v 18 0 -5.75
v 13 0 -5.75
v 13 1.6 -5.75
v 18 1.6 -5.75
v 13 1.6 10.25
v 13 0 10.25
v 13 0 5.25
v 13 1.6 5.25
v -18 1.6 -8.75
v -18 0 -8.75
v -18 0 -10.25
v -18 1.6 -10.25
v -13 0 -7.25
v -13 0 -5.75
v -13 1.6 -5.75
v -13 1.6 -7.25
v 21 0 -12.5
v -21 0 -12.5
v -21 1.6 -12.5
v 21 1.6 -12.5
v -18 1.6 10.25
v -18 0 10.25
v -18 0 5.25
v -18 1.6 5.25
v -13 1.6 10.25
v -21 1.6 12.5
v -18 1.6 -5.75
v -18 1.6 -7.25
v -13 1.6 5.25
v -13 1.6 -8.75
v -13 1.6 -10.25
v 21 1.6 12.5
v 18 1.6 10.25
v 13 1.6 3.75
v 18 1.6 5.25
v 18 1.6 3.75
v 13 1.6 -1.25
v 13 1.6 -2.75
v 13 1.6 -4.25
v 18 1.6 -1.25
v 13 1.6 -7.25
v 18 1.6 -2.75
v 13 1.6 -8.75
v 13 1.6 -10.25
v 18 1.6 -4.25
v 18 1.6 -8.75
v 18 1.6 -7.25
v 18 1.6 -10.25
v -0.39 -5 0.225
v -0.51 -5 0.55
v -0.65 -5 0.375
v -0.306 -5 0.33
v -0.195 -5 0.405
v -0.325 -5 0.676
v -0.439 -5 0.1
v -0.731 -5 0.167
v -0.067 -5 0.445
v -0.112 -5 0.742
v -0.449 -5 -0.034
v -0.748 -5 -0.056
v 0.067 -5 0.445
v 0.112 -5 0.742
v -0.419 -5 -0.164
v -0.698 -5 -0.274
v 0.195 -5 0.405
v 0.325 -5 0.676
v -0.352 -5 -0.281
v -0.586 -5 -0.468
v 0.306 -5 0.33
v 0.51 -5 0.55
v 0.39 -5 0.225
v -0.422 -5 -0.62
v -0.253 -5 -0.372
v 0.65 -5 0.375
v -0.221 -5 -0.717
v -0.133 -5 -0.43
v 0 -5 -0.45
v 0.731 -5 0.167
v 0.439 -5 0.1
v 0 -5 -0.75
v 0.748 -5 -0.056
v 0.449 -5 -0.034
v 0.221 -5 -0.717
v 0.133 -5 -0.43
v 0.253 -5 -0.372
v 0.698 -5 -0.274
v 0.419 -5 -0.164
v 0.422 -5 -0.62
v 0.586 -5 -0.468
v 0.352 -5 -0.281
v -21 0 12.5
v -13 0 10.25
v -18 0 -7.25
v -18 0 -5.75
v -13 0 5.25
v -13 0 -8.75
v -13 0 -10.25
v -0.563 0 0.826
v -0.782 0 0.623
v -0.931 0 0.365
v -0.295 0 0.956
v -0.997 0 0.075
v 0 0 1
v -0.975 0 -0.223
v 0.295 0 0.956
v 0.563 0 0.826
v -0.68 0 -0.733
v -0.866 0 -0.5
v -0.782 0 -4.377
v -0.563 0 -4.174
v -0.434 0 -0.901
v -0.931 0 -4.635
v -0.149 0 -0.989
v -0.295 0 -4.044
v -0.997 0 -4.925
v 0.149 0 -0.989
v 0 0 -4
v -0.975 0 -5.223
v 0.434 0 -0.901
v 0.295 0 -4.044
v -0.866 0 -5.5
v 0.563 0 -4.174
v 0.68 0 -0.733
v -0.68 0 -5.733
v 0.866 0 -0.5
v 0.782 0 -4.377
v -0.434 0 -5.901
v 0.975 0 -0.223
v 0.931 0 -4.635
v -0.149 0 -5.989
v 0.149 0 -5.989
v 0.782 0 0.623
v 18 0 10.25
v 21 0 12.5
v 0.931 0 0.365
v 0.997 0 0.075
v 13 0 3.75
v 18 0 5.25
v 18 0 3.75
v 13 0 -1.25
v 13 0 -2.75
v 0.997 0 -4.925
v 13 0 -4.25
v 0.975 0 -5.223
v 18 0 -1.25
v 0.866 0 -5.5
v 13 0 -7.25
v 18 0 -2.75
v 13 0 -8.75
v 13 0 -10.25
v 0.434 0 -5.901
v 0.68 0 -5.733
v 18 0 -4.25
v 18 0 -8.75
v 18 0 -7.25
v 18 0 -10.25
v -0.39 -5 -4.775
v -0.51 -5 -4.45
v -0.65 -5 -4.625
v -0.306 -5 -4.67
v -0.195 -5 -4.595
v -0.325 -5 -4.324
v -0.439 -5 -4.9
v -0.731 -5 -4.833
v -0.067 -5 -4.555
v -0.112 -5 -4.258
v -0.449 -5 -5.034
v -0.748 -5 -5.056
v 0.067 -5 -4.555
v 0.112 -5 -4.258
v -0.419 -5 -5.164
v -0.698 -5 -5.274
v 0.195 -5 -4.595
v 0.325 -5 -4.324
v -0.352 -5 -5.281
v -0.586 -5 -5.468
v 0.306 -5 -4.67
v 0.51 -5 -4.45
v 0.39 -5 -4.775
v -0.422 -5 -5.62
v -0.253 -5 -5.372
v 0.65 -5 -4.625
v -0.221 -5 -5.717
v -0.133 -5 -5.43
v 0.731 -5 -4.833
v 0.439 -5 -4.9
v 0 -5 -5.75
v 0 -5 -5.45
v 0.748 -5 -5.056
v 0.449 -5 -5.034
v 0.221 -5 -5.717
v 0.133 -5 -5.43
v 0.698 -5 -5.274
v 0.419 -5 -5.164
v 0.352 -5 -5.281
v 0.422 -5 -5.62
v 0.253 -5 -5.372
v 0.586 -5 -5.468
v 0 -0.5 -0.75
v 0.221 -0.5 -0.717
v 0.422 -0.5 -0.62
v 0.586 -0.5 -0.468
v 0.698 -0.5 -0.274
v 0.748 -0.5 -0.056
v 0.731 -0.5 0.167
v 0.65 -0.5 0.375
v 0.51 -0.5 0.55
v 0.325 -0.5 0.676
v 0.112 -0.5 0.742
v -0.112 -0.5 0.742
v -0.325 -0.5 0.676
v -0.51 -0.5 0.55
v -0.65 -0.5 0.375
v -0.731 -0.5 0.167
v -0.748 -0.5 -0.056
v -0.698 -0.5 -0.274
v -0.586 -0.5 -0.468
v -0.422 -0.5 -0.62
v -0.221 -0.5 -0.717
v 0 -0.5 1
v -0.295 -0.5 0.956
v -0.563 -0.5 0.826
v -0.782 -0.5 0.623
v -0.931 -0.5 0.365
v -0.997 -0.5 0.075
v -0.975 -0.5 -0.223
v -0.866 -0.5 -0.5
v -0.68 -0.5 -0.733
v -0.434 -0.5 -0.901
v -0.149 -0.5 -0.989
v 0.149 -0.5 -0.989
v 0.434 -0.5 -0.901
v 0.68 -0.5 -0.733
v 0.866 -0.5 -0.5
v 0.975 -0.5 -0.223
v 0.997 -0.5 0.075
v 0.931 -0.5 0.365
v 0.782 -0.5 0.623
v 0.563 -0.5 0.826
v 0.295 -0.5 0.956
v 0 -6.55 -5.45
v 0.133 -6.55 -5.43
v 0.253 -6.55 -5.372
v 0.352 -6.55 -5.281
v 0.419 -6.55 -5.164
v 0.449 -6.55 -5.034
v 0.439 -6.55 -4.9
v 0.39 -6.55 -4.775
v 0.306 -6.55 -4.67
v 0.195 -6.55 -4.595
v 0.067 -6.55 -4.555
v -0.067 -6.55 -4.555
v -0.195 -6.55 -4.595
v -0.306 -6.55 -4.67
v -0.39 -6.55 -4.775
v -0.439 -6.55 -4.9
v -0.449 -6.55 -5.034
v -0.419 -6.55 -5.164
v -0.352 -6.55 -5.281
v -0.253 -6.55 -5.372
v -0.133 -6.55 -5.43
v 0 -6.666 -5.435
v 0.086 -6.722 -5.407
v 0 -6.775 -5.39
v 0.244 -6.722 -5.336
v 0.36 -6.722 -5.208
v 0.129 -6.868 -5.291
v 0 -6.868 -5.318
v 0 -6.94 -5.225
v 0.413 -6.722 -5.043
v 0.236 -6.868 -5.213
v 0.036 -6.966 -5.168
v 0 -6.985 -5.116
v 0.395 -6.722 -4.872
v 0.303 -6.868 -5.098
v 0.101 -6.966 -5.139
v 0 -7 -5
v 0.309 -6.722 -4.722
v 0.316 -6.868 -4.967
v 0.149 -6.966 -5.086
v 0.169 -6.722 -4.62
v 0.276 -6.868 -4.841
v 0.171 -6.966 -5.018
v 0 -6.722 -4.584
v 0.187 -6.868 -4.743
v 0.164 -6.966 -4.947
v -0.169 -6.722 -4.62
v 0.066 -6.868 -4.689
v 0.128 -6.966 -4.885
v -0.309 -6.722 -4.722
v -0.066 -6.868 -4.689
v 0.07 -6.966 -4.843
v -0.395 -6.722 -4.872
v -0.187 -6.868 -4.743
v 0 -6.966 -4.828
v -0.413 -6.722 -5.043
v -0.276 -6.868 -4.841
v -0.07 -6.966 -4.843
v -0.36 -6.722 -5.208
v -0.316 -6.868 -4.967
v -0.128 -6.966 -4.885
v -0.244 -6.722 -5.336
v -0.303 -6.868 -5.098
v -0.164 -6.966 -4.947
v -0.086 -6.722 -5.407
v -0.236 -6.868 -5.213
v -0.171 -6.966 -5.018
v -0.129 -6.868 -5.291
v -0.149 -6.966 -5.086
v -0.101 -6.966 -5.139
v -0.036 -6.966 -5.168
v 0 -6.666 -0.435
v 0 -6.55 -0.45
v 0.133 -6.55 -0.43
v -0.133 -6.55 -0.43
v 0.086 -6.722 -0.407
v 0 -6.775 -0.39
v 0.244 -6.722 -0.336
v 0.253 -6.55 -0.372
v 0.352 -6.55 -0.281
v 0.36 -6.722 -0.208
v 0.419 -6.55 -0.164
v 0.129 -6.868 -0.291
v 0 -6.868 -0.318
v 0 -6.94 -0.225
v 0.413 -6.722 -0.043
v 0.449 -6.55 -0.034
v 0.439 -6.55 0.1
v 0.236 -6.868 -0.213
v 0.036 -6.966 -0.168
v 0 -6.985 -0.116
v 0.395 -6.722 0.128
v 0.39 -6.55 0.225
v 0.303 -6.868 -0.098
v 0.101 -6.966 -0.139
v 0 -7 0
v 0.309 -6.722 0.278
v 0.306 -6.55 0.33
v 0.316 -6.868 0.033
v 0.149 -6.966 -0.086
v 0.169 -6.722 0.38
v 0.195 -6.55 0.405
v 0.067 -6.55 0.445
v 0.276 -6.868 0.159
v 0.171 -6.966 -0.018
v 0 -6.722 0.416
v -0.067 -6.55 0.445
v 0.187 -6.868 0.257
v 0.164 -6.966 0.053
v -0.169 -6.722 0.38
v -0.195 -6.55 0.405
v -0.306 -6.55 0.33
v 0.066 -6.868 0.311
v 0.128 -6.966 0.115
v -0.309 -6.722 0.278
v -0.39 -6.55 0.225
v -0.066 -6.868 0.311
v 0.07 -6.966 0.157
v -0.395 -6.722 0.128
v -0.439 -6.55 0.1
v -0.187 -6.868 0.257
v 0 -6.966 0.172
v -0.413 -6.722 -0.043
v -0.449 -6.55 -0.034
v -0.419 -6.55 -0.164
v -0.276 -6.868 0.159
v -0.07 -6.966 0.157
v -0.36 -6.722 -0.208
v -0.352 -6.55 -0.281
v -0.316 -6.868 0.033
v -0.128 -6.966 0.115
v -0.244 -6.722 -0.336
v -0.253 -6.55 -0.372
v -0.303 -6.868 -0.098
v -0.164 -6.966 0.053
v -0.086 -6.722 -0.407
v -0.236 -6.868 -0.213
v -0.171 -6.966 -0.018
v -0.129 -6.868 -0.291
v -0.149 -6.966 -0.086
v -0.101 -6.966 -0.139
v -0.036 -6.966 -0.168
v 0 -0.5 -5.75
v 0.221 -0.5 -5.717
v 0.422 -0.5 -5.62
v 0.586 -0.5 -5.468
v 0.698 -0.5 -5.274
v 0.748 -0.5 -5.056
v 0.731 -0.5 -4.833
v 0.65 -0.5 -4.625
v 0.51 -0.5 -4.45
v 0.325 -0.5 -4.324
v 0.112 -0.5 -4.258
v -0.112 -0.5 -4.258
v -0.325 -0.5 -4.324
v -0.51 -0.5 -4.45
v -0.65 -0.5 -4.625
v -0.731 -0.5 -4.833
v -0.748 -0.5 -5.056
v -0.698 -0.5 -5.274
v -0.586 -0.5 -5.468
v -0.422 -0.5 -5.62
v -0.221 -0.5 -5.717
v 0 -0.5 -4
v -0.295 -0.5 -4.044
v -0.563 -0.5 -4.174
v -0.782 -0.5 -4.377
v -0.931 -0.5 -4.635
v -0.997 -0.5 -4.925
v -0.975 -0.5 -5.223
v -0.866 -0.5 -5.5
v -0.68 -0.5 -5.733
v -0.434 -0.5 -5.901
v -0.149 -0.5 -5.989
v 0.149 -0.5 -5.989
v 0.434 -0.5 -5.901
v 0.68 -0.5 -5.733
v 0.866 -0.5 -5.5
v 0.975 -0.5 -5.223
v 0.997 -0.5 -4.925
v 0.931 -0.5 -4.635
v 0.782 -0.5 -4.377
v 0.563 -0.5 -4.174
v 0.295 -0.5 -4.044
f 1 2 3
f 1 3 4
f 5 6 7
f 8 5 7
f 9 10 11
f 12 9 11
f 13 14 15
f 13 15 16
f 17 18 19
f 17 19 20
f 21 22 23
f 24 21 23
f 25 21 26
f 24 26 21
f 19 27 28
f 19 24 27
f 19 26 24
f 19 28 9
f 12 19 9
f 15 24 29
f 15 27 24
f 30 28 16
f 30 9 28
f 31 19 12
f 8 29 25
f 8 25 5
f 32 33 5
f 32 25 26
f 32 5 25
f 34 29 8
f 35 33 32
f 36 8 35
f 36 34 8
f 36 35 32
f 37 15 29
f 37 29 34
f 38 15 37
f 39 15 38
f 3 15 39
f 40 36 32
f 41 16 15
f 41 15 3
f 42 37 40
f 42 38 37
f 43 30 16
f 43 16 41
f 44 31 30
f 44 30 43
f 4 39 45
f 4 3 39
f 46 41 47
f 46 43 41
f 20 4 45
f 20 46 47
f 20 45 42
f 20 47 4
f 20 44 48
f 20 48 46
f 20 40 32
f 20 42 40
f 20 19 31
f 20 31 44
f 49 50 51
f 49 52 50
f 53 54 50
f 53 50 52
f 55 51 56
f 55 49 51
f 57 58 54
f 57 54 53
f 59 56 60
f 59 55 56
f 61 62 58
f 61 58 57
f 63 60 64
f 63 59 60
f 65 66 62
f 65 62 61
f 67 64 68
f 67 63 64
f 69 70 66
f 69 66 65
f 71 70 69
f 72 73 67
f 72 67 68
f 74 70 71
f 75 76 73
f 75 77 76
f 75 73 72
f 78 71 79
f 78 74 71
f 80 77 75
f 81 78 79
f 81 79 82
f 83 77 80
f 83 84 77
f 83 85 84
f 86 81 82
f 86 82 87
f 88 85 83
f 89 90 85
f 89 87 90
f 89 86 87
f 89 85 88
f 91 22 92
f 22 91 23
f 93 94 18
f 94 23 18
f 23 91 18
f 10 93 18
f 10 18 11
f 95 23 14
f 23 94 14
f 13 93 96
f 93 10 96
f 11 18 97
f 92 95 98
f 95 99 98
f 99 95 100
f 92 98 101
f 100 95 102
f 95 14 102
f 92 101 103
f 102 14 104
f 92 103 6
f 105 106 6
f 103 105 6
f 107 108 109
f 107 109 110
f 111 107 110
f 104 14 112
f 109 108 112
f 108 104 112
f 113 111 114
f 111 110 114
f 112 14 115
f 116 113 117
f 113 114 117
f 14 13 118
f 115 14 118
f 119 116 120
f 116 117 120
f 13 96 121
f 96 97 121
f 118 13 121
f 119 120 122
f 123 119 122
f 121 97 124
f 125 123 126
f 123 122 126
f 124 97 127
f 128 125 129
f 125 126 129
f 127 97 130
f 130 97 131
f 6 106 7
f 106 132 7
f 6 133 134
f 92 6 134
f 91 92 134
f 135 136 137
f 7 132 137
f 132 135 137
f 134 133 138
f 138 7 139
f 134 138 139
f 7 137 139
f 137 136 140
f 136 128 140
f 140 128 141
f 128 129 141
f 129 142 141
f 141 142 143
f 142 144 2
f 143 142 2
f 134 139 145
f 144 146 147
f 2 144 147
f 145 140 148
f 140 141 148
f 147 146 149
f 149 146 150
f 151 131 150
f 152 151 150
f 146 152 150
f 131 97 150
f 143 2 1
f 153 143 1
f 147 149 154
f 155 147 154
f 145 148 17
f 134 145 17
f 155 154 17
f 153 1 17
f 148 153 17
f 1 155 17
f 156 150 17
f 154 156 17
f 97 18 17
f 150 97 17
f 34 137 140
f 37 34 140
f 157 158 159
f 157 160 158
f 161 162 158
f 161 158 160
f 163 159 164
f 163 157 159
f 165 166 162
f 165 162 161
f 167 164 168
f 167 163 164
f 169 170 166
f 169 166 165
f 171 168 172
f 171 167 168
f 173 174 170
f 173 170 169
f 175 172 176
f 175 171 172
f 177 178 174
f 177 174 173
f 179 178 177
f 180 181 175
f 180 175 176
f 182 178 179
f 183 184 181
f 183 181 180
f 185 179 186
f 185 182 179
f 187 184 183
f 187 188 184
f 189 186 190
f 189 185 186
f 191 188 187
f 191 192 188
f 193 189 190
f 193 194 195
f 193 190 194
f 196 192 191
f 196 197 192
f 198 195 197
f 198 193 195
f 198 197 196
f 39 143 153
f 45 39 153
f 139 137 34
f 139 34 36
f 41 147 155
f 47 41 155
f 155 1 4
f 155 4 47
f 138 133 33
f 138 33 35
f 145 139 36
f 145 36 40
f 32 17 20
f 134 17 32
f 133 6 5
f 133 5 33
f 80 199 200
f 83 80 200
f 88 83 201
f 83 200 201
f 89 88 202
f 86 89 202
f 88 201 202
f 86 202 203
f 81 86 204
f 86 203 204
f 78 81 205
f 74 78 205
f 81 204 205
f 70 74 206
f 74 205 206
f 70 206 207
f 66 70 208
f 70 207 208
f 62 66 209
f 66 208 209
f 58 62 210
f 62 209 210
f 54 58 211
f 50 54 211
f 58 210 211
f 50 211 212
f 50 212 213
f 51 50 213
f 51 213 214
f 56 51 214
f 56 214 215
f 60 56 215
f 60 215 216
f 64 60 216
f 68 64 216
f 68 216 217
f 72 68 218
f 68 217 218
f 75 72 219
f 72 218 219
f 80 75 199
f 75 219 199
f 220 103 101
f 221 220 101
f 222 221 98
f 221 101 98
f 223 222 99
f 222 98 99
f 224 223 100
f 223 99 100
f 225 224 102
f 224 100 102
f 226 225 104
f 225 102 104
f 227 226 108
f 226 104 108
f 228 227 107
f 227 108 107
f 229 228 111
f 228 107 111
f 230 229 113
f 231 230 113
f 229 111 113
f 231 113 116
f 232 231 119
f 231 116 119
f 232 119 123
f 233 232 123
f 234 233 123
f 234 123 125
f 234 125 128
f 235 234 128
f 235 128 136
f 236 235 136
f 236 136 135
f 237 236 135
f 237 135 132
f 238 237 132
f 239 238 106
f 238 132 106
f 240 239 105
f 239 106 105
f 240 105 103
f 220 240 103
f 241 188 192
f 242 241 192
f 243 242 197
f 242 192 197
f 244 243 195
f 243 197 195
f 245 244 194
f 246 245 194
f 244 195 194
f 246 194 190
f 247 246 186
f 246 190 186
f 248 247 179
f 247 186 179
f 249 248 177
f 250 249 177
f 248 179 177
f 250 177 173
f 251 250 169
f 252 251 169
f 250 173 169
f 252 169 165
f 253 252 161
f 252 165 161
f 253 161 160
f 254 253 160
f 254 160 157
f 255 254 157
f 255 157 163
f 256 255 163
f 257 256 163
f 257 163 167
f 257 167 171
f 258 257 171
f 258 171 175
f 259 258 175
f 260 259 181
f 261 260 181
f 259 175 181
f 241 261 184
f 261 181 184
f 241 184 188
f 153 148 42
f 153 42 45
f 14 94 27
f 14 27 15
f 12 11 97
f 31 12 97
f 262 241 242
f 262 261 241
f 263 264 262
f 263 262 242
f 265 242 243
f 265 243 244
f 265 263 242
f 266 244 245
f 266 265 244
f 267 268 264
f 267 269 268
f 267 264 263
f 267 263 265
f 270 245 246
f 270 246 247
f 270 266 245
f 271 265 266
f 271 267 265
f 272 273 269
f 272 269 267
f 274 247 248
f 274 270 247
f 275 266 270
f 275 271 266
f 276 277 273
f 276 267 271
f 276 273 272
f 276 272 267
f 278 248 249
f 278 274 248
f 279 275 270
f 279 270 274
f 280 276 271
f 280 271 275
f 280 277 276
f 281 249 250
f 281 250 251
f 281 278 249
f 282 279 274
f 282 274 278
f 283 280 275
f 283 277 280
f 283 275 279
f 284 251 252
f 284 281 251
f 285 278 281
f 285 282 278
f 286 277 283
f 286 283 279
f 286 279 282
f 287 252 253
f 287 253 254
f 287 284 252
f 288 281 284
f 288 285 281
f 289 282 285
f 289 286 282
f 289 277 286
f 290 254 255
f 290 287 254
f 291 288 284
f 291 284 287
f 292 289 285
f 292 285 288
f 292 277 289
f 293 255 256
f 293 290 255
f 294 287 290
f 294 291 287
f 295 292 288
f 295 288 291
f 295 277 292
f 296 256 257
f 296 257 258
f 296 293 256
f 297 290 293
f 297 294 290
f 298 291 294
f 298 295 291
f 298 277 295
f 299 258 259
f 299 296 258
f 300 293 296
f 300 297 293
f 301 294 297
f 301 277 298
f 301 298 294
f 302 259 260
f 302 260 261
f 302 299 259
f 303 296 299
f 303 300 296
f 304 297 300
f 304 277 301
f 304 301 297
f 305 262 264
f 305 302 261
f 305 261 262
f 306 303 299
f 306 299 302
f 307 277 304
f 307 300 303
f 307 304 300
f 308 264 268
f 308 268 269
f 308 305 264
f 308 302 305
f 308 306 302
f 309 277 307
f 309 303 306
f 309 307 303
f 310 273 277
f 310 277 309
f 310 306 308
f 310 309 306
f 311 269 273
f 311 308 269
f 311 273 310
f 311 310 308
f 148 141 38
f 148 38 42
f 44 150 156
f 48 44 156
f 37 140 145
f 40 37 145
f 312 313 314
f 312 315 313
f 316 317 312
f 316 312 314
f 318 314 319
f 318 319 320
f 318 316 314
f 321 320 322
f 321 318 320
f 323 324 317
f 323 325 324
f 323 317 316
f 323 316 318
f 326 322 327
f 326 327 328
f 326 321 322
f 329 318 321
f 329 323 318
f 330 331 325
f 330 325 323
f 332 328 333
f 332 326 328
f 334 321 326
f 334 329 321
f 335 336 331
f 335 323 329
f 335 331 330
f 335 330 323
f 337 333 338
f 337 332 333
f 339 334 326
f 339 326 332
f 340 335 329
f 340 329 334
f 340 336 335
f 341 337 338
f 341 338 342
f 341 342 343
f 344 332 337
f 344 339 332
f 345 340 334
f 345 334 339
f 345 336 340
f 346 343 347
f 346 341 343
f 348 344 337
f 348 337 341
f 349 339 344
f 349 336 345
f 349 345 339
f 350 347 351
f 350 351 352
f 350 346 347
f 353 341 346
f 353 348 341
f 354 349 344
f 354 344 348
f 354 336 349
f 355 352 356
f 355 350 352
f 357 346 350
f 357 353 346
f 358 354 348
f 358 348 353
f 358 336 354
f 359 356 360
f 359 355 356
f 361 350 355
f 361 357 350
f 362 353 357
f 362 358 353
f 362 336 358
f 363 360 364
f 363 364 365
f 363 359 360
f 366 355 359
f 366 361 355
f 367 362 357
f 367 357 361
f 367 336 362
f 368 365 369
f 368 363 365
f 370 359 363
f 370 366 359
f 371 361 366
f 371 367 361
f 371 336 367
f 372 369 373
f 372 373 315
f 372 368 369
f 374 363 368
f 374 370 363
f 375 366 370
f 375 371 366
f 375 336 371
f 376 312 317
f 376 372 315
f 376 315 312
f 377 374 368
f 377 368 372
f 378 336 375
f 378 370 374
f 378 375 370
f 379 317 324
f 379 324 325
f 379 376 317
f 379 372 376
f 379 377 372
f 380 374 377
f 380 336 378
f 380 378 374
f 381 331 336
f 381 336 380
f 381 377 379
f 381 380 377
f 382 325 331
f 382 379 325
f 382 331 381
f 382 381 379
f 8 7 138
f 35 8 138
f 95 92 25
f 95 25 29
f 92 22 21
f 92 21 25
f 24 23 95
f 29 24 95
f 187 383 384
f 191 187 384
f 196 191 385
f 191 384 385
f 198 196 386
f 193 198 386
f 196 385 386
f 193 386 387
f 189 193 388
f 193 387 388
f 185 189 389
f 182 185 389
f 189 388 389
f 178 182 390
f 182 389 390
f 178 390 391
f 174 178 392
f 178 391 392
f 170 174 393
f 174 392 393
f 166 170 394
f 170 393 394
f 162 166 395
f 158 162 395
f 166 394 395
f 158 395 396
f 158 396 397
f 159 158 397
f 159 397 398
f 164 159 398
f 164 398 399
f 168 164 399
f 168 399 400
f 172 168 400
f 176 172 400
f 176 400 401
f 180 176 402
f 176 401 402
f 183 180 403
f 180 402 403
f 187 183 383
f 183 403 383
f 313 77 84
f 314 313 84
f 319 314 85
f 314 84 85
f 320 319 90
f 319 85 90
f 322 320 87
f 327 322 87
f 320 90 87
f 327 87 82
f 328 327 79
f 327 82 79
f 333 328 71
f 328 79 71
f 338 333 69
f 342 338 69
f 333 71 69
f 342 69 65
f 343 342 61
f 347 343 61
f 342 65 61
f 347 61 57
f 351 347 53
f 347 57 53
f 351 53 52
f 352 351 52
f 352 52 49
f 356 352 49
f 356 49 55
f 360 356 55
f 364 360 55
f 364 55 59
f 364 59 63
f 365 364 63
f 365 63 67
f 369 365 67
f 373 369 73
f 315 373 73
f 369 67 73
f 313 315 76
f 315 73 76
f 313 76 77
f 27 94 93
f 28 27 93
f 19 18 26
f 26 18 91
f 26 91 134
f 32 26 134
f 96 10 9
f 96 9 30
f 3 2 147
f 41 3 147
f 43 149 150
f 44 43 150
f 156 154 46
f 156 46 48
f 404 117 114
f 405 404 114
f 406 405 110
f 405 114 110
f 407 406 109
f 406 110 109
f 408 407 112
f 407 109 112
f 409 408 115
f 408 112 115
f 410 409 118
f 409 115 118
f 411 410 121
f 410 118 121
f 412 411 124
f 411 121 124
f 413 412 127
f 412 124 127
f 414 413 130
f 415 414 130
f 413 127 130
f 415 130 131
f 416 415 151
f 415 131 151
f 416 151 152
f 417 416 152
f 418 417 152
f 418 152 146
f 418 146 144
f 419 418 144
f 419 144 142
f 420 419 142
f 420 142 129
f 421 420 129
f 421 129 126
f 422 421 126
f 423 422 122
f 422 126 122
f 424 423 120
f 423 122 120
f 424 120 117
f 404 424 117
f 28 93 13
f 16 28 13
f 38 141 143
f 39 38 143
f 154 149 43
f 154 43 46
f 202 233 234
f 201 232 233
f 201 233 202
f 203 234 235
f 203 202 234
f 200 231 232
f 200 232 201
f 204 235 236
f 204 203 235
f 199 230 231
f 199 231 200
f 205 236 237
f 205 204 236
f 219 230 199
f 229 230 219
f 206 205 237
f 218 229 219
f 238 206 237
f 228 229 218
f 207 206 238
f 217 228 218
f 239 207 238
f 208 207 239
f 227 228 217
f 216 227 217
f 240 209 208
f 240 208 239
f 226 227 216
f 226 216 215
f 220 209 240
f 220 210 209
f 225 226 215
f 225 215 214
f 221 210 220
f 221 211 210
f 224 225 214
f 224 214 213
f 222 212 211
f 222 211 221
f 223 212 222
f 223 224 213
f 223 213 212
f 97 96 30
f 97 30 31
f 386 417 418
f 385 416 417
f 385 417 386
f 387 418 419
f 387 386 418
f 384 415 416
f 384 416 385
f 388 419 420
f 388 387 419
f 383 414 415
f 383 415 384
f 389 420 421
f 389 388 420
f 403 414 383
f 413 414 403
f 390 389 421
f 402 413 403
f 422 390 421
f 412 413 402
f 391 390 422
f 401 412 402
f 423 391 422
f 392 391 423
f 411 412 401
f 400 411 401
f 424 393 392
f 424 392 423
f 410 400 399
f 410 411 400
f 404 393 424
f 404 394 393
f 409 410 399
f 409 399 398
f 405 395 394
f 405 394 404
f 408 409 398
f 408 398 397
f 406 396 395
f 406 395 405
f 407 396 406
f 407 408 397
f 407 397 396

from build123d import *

# Parameters (mm, degrees)
SKETCH1_W           = 48
SKETCH1_H           = 25
SKETCH1_W_2         = 5
SKETCH1_H_2         = 1.5
SKETCH1_H_3         = 5
BOSS_EXTRUDE1_DEPTH = 1.6
SKETCH3_R           = 1
BOSS_EXTRUDE2_DEPTH = 0.5
SKETCH4_R           = 0.75
BOSS_EXTRUDE3_DEPTH = 4.5
SKETCH5_R           = 0.45
BOSS_EXTRUDE4_DEPTH = 2
FILLET1_R           = 0.45
SKETCH6_W           = 3
SKETCH6_H           = 25
CUT_EXTRUDE1_DEPTH  = 10


with BuildPart() as part:
    # Sketch1 → Boss-Extrude1 (new body)
    with BuildSketch(Plane(origin=(0, 0, 0), x_dir=(1, 0, 0), z_dir=(0, 1, 0))):
        Rectangle(SKETCH1_W, SKETCH1_H)
        with Locations((15.5, 3.5)):
            Rectangle(SKETCH1_W_2, SKETCH1_H_2, mode=Mode.SUBTRACT)
        with Locations((15.5, -1.25)):
            Rectangle(SKETCH1_W_2, SKETCH1_H_3, mode=Mode.SUBTRACT)
        with Locations((-15.5, 9.5)):
            Rectangle(SKETCH1_W_2, SKETCH1_H_2, mode=Mode.SUBTRACT)
        with Locations((15.5, 9.5)):
            Rectangle(SKETCH1_W_2, SKETCH1_H_2, mode=Mode.SUBTRACT)
        with Locations((15.5, 6.5)):
            Rectangle(SKETCH1_W_2, SKETCH1_H_2, mode=Mode.SUBTRACT)
        with Locations((15.5, -7.75)):
            Rectangle(SKETCH1_W_2, SKETCH1_H_3, mode=Mode.SUBTRACT)
        with Locations((-15.5, -7.75)):
            Rectangle(SKETCH1_W_2, SKETCH1_H_3, mode=Mode.SUBTRACT)
        with Locations((-15.5, 6.5)):
            Rectangle(SKETCH1_W_2, SKETCH1_H_2, mode=Mode.SUBTRACT)
    extrude(amount=BOSS_EXTRUDE1_DEPTH)

    # Sketch3 → Boss-Extrude2 (add)
    with BuildSketch(Plane.XZ):
        with Locations(Location((0, 0, 0), (0, 0, 90))):
            Circle(SKETCH3_R)
        with Locations(Location((0, -5, 0), (0, 0, 90))):
            Circle(SKETCH3_R)
    extrude(amount=BOSS_EXTRUDE2_DEPTH)

    # Sketch4 → Boss-Extrude3 (add)
    with BuildSketch(Plane.XZ.offset(0.5)):
        with Locations(Location((0, 0, 0), (0, 0, 270))):
            Circle(SKETCH4_R)
        with Locations(Location((0, -5, 0), (0, 0, 270))):
            Circle(SKETCH4_R)
    extrude(amount=BOSS_EXTRUDE3_DEPTH)

    # Sketch5 → Boss-Extrude4 (add)
    with BuildSketch(Plane.XZ.offset(5)):
        with Locations(Location((0, 0, 0), (0, 0, 270))):
            Circle(SKETCH5_R)
        with Locations(Location((0, -5, 0), (0, 0, 270))):
            Circle(SKETCH5_R)
    extrude(amount=BOSS_EXTRUDE4_DEPTH)

    # Fillet1
    fillet1_edges = [part.edges().sort_by_distance(p)[0] for p in [
        (0, -7, 0.45),
        (0, -7, -4.55),
    ]]
    fillet(fillet1_edges, radius=FILLET1_R)

    # Sketch6 → Cut-Extrude1 (cut)
    with BuildSketch(Plane.XZ):
        with Locations((-22.5, 0)):
            Rectangle(SKETCH6_W, SKETCH6_H)
        with Locations((22.5, 0)):
            Rectangle(SKETCH6_W, SKETCH6_H)
    extrude(amount=-CUT_EXTRUDE1_DEPTH, mode=Mode.SUBTRACT)


solid = part.part
